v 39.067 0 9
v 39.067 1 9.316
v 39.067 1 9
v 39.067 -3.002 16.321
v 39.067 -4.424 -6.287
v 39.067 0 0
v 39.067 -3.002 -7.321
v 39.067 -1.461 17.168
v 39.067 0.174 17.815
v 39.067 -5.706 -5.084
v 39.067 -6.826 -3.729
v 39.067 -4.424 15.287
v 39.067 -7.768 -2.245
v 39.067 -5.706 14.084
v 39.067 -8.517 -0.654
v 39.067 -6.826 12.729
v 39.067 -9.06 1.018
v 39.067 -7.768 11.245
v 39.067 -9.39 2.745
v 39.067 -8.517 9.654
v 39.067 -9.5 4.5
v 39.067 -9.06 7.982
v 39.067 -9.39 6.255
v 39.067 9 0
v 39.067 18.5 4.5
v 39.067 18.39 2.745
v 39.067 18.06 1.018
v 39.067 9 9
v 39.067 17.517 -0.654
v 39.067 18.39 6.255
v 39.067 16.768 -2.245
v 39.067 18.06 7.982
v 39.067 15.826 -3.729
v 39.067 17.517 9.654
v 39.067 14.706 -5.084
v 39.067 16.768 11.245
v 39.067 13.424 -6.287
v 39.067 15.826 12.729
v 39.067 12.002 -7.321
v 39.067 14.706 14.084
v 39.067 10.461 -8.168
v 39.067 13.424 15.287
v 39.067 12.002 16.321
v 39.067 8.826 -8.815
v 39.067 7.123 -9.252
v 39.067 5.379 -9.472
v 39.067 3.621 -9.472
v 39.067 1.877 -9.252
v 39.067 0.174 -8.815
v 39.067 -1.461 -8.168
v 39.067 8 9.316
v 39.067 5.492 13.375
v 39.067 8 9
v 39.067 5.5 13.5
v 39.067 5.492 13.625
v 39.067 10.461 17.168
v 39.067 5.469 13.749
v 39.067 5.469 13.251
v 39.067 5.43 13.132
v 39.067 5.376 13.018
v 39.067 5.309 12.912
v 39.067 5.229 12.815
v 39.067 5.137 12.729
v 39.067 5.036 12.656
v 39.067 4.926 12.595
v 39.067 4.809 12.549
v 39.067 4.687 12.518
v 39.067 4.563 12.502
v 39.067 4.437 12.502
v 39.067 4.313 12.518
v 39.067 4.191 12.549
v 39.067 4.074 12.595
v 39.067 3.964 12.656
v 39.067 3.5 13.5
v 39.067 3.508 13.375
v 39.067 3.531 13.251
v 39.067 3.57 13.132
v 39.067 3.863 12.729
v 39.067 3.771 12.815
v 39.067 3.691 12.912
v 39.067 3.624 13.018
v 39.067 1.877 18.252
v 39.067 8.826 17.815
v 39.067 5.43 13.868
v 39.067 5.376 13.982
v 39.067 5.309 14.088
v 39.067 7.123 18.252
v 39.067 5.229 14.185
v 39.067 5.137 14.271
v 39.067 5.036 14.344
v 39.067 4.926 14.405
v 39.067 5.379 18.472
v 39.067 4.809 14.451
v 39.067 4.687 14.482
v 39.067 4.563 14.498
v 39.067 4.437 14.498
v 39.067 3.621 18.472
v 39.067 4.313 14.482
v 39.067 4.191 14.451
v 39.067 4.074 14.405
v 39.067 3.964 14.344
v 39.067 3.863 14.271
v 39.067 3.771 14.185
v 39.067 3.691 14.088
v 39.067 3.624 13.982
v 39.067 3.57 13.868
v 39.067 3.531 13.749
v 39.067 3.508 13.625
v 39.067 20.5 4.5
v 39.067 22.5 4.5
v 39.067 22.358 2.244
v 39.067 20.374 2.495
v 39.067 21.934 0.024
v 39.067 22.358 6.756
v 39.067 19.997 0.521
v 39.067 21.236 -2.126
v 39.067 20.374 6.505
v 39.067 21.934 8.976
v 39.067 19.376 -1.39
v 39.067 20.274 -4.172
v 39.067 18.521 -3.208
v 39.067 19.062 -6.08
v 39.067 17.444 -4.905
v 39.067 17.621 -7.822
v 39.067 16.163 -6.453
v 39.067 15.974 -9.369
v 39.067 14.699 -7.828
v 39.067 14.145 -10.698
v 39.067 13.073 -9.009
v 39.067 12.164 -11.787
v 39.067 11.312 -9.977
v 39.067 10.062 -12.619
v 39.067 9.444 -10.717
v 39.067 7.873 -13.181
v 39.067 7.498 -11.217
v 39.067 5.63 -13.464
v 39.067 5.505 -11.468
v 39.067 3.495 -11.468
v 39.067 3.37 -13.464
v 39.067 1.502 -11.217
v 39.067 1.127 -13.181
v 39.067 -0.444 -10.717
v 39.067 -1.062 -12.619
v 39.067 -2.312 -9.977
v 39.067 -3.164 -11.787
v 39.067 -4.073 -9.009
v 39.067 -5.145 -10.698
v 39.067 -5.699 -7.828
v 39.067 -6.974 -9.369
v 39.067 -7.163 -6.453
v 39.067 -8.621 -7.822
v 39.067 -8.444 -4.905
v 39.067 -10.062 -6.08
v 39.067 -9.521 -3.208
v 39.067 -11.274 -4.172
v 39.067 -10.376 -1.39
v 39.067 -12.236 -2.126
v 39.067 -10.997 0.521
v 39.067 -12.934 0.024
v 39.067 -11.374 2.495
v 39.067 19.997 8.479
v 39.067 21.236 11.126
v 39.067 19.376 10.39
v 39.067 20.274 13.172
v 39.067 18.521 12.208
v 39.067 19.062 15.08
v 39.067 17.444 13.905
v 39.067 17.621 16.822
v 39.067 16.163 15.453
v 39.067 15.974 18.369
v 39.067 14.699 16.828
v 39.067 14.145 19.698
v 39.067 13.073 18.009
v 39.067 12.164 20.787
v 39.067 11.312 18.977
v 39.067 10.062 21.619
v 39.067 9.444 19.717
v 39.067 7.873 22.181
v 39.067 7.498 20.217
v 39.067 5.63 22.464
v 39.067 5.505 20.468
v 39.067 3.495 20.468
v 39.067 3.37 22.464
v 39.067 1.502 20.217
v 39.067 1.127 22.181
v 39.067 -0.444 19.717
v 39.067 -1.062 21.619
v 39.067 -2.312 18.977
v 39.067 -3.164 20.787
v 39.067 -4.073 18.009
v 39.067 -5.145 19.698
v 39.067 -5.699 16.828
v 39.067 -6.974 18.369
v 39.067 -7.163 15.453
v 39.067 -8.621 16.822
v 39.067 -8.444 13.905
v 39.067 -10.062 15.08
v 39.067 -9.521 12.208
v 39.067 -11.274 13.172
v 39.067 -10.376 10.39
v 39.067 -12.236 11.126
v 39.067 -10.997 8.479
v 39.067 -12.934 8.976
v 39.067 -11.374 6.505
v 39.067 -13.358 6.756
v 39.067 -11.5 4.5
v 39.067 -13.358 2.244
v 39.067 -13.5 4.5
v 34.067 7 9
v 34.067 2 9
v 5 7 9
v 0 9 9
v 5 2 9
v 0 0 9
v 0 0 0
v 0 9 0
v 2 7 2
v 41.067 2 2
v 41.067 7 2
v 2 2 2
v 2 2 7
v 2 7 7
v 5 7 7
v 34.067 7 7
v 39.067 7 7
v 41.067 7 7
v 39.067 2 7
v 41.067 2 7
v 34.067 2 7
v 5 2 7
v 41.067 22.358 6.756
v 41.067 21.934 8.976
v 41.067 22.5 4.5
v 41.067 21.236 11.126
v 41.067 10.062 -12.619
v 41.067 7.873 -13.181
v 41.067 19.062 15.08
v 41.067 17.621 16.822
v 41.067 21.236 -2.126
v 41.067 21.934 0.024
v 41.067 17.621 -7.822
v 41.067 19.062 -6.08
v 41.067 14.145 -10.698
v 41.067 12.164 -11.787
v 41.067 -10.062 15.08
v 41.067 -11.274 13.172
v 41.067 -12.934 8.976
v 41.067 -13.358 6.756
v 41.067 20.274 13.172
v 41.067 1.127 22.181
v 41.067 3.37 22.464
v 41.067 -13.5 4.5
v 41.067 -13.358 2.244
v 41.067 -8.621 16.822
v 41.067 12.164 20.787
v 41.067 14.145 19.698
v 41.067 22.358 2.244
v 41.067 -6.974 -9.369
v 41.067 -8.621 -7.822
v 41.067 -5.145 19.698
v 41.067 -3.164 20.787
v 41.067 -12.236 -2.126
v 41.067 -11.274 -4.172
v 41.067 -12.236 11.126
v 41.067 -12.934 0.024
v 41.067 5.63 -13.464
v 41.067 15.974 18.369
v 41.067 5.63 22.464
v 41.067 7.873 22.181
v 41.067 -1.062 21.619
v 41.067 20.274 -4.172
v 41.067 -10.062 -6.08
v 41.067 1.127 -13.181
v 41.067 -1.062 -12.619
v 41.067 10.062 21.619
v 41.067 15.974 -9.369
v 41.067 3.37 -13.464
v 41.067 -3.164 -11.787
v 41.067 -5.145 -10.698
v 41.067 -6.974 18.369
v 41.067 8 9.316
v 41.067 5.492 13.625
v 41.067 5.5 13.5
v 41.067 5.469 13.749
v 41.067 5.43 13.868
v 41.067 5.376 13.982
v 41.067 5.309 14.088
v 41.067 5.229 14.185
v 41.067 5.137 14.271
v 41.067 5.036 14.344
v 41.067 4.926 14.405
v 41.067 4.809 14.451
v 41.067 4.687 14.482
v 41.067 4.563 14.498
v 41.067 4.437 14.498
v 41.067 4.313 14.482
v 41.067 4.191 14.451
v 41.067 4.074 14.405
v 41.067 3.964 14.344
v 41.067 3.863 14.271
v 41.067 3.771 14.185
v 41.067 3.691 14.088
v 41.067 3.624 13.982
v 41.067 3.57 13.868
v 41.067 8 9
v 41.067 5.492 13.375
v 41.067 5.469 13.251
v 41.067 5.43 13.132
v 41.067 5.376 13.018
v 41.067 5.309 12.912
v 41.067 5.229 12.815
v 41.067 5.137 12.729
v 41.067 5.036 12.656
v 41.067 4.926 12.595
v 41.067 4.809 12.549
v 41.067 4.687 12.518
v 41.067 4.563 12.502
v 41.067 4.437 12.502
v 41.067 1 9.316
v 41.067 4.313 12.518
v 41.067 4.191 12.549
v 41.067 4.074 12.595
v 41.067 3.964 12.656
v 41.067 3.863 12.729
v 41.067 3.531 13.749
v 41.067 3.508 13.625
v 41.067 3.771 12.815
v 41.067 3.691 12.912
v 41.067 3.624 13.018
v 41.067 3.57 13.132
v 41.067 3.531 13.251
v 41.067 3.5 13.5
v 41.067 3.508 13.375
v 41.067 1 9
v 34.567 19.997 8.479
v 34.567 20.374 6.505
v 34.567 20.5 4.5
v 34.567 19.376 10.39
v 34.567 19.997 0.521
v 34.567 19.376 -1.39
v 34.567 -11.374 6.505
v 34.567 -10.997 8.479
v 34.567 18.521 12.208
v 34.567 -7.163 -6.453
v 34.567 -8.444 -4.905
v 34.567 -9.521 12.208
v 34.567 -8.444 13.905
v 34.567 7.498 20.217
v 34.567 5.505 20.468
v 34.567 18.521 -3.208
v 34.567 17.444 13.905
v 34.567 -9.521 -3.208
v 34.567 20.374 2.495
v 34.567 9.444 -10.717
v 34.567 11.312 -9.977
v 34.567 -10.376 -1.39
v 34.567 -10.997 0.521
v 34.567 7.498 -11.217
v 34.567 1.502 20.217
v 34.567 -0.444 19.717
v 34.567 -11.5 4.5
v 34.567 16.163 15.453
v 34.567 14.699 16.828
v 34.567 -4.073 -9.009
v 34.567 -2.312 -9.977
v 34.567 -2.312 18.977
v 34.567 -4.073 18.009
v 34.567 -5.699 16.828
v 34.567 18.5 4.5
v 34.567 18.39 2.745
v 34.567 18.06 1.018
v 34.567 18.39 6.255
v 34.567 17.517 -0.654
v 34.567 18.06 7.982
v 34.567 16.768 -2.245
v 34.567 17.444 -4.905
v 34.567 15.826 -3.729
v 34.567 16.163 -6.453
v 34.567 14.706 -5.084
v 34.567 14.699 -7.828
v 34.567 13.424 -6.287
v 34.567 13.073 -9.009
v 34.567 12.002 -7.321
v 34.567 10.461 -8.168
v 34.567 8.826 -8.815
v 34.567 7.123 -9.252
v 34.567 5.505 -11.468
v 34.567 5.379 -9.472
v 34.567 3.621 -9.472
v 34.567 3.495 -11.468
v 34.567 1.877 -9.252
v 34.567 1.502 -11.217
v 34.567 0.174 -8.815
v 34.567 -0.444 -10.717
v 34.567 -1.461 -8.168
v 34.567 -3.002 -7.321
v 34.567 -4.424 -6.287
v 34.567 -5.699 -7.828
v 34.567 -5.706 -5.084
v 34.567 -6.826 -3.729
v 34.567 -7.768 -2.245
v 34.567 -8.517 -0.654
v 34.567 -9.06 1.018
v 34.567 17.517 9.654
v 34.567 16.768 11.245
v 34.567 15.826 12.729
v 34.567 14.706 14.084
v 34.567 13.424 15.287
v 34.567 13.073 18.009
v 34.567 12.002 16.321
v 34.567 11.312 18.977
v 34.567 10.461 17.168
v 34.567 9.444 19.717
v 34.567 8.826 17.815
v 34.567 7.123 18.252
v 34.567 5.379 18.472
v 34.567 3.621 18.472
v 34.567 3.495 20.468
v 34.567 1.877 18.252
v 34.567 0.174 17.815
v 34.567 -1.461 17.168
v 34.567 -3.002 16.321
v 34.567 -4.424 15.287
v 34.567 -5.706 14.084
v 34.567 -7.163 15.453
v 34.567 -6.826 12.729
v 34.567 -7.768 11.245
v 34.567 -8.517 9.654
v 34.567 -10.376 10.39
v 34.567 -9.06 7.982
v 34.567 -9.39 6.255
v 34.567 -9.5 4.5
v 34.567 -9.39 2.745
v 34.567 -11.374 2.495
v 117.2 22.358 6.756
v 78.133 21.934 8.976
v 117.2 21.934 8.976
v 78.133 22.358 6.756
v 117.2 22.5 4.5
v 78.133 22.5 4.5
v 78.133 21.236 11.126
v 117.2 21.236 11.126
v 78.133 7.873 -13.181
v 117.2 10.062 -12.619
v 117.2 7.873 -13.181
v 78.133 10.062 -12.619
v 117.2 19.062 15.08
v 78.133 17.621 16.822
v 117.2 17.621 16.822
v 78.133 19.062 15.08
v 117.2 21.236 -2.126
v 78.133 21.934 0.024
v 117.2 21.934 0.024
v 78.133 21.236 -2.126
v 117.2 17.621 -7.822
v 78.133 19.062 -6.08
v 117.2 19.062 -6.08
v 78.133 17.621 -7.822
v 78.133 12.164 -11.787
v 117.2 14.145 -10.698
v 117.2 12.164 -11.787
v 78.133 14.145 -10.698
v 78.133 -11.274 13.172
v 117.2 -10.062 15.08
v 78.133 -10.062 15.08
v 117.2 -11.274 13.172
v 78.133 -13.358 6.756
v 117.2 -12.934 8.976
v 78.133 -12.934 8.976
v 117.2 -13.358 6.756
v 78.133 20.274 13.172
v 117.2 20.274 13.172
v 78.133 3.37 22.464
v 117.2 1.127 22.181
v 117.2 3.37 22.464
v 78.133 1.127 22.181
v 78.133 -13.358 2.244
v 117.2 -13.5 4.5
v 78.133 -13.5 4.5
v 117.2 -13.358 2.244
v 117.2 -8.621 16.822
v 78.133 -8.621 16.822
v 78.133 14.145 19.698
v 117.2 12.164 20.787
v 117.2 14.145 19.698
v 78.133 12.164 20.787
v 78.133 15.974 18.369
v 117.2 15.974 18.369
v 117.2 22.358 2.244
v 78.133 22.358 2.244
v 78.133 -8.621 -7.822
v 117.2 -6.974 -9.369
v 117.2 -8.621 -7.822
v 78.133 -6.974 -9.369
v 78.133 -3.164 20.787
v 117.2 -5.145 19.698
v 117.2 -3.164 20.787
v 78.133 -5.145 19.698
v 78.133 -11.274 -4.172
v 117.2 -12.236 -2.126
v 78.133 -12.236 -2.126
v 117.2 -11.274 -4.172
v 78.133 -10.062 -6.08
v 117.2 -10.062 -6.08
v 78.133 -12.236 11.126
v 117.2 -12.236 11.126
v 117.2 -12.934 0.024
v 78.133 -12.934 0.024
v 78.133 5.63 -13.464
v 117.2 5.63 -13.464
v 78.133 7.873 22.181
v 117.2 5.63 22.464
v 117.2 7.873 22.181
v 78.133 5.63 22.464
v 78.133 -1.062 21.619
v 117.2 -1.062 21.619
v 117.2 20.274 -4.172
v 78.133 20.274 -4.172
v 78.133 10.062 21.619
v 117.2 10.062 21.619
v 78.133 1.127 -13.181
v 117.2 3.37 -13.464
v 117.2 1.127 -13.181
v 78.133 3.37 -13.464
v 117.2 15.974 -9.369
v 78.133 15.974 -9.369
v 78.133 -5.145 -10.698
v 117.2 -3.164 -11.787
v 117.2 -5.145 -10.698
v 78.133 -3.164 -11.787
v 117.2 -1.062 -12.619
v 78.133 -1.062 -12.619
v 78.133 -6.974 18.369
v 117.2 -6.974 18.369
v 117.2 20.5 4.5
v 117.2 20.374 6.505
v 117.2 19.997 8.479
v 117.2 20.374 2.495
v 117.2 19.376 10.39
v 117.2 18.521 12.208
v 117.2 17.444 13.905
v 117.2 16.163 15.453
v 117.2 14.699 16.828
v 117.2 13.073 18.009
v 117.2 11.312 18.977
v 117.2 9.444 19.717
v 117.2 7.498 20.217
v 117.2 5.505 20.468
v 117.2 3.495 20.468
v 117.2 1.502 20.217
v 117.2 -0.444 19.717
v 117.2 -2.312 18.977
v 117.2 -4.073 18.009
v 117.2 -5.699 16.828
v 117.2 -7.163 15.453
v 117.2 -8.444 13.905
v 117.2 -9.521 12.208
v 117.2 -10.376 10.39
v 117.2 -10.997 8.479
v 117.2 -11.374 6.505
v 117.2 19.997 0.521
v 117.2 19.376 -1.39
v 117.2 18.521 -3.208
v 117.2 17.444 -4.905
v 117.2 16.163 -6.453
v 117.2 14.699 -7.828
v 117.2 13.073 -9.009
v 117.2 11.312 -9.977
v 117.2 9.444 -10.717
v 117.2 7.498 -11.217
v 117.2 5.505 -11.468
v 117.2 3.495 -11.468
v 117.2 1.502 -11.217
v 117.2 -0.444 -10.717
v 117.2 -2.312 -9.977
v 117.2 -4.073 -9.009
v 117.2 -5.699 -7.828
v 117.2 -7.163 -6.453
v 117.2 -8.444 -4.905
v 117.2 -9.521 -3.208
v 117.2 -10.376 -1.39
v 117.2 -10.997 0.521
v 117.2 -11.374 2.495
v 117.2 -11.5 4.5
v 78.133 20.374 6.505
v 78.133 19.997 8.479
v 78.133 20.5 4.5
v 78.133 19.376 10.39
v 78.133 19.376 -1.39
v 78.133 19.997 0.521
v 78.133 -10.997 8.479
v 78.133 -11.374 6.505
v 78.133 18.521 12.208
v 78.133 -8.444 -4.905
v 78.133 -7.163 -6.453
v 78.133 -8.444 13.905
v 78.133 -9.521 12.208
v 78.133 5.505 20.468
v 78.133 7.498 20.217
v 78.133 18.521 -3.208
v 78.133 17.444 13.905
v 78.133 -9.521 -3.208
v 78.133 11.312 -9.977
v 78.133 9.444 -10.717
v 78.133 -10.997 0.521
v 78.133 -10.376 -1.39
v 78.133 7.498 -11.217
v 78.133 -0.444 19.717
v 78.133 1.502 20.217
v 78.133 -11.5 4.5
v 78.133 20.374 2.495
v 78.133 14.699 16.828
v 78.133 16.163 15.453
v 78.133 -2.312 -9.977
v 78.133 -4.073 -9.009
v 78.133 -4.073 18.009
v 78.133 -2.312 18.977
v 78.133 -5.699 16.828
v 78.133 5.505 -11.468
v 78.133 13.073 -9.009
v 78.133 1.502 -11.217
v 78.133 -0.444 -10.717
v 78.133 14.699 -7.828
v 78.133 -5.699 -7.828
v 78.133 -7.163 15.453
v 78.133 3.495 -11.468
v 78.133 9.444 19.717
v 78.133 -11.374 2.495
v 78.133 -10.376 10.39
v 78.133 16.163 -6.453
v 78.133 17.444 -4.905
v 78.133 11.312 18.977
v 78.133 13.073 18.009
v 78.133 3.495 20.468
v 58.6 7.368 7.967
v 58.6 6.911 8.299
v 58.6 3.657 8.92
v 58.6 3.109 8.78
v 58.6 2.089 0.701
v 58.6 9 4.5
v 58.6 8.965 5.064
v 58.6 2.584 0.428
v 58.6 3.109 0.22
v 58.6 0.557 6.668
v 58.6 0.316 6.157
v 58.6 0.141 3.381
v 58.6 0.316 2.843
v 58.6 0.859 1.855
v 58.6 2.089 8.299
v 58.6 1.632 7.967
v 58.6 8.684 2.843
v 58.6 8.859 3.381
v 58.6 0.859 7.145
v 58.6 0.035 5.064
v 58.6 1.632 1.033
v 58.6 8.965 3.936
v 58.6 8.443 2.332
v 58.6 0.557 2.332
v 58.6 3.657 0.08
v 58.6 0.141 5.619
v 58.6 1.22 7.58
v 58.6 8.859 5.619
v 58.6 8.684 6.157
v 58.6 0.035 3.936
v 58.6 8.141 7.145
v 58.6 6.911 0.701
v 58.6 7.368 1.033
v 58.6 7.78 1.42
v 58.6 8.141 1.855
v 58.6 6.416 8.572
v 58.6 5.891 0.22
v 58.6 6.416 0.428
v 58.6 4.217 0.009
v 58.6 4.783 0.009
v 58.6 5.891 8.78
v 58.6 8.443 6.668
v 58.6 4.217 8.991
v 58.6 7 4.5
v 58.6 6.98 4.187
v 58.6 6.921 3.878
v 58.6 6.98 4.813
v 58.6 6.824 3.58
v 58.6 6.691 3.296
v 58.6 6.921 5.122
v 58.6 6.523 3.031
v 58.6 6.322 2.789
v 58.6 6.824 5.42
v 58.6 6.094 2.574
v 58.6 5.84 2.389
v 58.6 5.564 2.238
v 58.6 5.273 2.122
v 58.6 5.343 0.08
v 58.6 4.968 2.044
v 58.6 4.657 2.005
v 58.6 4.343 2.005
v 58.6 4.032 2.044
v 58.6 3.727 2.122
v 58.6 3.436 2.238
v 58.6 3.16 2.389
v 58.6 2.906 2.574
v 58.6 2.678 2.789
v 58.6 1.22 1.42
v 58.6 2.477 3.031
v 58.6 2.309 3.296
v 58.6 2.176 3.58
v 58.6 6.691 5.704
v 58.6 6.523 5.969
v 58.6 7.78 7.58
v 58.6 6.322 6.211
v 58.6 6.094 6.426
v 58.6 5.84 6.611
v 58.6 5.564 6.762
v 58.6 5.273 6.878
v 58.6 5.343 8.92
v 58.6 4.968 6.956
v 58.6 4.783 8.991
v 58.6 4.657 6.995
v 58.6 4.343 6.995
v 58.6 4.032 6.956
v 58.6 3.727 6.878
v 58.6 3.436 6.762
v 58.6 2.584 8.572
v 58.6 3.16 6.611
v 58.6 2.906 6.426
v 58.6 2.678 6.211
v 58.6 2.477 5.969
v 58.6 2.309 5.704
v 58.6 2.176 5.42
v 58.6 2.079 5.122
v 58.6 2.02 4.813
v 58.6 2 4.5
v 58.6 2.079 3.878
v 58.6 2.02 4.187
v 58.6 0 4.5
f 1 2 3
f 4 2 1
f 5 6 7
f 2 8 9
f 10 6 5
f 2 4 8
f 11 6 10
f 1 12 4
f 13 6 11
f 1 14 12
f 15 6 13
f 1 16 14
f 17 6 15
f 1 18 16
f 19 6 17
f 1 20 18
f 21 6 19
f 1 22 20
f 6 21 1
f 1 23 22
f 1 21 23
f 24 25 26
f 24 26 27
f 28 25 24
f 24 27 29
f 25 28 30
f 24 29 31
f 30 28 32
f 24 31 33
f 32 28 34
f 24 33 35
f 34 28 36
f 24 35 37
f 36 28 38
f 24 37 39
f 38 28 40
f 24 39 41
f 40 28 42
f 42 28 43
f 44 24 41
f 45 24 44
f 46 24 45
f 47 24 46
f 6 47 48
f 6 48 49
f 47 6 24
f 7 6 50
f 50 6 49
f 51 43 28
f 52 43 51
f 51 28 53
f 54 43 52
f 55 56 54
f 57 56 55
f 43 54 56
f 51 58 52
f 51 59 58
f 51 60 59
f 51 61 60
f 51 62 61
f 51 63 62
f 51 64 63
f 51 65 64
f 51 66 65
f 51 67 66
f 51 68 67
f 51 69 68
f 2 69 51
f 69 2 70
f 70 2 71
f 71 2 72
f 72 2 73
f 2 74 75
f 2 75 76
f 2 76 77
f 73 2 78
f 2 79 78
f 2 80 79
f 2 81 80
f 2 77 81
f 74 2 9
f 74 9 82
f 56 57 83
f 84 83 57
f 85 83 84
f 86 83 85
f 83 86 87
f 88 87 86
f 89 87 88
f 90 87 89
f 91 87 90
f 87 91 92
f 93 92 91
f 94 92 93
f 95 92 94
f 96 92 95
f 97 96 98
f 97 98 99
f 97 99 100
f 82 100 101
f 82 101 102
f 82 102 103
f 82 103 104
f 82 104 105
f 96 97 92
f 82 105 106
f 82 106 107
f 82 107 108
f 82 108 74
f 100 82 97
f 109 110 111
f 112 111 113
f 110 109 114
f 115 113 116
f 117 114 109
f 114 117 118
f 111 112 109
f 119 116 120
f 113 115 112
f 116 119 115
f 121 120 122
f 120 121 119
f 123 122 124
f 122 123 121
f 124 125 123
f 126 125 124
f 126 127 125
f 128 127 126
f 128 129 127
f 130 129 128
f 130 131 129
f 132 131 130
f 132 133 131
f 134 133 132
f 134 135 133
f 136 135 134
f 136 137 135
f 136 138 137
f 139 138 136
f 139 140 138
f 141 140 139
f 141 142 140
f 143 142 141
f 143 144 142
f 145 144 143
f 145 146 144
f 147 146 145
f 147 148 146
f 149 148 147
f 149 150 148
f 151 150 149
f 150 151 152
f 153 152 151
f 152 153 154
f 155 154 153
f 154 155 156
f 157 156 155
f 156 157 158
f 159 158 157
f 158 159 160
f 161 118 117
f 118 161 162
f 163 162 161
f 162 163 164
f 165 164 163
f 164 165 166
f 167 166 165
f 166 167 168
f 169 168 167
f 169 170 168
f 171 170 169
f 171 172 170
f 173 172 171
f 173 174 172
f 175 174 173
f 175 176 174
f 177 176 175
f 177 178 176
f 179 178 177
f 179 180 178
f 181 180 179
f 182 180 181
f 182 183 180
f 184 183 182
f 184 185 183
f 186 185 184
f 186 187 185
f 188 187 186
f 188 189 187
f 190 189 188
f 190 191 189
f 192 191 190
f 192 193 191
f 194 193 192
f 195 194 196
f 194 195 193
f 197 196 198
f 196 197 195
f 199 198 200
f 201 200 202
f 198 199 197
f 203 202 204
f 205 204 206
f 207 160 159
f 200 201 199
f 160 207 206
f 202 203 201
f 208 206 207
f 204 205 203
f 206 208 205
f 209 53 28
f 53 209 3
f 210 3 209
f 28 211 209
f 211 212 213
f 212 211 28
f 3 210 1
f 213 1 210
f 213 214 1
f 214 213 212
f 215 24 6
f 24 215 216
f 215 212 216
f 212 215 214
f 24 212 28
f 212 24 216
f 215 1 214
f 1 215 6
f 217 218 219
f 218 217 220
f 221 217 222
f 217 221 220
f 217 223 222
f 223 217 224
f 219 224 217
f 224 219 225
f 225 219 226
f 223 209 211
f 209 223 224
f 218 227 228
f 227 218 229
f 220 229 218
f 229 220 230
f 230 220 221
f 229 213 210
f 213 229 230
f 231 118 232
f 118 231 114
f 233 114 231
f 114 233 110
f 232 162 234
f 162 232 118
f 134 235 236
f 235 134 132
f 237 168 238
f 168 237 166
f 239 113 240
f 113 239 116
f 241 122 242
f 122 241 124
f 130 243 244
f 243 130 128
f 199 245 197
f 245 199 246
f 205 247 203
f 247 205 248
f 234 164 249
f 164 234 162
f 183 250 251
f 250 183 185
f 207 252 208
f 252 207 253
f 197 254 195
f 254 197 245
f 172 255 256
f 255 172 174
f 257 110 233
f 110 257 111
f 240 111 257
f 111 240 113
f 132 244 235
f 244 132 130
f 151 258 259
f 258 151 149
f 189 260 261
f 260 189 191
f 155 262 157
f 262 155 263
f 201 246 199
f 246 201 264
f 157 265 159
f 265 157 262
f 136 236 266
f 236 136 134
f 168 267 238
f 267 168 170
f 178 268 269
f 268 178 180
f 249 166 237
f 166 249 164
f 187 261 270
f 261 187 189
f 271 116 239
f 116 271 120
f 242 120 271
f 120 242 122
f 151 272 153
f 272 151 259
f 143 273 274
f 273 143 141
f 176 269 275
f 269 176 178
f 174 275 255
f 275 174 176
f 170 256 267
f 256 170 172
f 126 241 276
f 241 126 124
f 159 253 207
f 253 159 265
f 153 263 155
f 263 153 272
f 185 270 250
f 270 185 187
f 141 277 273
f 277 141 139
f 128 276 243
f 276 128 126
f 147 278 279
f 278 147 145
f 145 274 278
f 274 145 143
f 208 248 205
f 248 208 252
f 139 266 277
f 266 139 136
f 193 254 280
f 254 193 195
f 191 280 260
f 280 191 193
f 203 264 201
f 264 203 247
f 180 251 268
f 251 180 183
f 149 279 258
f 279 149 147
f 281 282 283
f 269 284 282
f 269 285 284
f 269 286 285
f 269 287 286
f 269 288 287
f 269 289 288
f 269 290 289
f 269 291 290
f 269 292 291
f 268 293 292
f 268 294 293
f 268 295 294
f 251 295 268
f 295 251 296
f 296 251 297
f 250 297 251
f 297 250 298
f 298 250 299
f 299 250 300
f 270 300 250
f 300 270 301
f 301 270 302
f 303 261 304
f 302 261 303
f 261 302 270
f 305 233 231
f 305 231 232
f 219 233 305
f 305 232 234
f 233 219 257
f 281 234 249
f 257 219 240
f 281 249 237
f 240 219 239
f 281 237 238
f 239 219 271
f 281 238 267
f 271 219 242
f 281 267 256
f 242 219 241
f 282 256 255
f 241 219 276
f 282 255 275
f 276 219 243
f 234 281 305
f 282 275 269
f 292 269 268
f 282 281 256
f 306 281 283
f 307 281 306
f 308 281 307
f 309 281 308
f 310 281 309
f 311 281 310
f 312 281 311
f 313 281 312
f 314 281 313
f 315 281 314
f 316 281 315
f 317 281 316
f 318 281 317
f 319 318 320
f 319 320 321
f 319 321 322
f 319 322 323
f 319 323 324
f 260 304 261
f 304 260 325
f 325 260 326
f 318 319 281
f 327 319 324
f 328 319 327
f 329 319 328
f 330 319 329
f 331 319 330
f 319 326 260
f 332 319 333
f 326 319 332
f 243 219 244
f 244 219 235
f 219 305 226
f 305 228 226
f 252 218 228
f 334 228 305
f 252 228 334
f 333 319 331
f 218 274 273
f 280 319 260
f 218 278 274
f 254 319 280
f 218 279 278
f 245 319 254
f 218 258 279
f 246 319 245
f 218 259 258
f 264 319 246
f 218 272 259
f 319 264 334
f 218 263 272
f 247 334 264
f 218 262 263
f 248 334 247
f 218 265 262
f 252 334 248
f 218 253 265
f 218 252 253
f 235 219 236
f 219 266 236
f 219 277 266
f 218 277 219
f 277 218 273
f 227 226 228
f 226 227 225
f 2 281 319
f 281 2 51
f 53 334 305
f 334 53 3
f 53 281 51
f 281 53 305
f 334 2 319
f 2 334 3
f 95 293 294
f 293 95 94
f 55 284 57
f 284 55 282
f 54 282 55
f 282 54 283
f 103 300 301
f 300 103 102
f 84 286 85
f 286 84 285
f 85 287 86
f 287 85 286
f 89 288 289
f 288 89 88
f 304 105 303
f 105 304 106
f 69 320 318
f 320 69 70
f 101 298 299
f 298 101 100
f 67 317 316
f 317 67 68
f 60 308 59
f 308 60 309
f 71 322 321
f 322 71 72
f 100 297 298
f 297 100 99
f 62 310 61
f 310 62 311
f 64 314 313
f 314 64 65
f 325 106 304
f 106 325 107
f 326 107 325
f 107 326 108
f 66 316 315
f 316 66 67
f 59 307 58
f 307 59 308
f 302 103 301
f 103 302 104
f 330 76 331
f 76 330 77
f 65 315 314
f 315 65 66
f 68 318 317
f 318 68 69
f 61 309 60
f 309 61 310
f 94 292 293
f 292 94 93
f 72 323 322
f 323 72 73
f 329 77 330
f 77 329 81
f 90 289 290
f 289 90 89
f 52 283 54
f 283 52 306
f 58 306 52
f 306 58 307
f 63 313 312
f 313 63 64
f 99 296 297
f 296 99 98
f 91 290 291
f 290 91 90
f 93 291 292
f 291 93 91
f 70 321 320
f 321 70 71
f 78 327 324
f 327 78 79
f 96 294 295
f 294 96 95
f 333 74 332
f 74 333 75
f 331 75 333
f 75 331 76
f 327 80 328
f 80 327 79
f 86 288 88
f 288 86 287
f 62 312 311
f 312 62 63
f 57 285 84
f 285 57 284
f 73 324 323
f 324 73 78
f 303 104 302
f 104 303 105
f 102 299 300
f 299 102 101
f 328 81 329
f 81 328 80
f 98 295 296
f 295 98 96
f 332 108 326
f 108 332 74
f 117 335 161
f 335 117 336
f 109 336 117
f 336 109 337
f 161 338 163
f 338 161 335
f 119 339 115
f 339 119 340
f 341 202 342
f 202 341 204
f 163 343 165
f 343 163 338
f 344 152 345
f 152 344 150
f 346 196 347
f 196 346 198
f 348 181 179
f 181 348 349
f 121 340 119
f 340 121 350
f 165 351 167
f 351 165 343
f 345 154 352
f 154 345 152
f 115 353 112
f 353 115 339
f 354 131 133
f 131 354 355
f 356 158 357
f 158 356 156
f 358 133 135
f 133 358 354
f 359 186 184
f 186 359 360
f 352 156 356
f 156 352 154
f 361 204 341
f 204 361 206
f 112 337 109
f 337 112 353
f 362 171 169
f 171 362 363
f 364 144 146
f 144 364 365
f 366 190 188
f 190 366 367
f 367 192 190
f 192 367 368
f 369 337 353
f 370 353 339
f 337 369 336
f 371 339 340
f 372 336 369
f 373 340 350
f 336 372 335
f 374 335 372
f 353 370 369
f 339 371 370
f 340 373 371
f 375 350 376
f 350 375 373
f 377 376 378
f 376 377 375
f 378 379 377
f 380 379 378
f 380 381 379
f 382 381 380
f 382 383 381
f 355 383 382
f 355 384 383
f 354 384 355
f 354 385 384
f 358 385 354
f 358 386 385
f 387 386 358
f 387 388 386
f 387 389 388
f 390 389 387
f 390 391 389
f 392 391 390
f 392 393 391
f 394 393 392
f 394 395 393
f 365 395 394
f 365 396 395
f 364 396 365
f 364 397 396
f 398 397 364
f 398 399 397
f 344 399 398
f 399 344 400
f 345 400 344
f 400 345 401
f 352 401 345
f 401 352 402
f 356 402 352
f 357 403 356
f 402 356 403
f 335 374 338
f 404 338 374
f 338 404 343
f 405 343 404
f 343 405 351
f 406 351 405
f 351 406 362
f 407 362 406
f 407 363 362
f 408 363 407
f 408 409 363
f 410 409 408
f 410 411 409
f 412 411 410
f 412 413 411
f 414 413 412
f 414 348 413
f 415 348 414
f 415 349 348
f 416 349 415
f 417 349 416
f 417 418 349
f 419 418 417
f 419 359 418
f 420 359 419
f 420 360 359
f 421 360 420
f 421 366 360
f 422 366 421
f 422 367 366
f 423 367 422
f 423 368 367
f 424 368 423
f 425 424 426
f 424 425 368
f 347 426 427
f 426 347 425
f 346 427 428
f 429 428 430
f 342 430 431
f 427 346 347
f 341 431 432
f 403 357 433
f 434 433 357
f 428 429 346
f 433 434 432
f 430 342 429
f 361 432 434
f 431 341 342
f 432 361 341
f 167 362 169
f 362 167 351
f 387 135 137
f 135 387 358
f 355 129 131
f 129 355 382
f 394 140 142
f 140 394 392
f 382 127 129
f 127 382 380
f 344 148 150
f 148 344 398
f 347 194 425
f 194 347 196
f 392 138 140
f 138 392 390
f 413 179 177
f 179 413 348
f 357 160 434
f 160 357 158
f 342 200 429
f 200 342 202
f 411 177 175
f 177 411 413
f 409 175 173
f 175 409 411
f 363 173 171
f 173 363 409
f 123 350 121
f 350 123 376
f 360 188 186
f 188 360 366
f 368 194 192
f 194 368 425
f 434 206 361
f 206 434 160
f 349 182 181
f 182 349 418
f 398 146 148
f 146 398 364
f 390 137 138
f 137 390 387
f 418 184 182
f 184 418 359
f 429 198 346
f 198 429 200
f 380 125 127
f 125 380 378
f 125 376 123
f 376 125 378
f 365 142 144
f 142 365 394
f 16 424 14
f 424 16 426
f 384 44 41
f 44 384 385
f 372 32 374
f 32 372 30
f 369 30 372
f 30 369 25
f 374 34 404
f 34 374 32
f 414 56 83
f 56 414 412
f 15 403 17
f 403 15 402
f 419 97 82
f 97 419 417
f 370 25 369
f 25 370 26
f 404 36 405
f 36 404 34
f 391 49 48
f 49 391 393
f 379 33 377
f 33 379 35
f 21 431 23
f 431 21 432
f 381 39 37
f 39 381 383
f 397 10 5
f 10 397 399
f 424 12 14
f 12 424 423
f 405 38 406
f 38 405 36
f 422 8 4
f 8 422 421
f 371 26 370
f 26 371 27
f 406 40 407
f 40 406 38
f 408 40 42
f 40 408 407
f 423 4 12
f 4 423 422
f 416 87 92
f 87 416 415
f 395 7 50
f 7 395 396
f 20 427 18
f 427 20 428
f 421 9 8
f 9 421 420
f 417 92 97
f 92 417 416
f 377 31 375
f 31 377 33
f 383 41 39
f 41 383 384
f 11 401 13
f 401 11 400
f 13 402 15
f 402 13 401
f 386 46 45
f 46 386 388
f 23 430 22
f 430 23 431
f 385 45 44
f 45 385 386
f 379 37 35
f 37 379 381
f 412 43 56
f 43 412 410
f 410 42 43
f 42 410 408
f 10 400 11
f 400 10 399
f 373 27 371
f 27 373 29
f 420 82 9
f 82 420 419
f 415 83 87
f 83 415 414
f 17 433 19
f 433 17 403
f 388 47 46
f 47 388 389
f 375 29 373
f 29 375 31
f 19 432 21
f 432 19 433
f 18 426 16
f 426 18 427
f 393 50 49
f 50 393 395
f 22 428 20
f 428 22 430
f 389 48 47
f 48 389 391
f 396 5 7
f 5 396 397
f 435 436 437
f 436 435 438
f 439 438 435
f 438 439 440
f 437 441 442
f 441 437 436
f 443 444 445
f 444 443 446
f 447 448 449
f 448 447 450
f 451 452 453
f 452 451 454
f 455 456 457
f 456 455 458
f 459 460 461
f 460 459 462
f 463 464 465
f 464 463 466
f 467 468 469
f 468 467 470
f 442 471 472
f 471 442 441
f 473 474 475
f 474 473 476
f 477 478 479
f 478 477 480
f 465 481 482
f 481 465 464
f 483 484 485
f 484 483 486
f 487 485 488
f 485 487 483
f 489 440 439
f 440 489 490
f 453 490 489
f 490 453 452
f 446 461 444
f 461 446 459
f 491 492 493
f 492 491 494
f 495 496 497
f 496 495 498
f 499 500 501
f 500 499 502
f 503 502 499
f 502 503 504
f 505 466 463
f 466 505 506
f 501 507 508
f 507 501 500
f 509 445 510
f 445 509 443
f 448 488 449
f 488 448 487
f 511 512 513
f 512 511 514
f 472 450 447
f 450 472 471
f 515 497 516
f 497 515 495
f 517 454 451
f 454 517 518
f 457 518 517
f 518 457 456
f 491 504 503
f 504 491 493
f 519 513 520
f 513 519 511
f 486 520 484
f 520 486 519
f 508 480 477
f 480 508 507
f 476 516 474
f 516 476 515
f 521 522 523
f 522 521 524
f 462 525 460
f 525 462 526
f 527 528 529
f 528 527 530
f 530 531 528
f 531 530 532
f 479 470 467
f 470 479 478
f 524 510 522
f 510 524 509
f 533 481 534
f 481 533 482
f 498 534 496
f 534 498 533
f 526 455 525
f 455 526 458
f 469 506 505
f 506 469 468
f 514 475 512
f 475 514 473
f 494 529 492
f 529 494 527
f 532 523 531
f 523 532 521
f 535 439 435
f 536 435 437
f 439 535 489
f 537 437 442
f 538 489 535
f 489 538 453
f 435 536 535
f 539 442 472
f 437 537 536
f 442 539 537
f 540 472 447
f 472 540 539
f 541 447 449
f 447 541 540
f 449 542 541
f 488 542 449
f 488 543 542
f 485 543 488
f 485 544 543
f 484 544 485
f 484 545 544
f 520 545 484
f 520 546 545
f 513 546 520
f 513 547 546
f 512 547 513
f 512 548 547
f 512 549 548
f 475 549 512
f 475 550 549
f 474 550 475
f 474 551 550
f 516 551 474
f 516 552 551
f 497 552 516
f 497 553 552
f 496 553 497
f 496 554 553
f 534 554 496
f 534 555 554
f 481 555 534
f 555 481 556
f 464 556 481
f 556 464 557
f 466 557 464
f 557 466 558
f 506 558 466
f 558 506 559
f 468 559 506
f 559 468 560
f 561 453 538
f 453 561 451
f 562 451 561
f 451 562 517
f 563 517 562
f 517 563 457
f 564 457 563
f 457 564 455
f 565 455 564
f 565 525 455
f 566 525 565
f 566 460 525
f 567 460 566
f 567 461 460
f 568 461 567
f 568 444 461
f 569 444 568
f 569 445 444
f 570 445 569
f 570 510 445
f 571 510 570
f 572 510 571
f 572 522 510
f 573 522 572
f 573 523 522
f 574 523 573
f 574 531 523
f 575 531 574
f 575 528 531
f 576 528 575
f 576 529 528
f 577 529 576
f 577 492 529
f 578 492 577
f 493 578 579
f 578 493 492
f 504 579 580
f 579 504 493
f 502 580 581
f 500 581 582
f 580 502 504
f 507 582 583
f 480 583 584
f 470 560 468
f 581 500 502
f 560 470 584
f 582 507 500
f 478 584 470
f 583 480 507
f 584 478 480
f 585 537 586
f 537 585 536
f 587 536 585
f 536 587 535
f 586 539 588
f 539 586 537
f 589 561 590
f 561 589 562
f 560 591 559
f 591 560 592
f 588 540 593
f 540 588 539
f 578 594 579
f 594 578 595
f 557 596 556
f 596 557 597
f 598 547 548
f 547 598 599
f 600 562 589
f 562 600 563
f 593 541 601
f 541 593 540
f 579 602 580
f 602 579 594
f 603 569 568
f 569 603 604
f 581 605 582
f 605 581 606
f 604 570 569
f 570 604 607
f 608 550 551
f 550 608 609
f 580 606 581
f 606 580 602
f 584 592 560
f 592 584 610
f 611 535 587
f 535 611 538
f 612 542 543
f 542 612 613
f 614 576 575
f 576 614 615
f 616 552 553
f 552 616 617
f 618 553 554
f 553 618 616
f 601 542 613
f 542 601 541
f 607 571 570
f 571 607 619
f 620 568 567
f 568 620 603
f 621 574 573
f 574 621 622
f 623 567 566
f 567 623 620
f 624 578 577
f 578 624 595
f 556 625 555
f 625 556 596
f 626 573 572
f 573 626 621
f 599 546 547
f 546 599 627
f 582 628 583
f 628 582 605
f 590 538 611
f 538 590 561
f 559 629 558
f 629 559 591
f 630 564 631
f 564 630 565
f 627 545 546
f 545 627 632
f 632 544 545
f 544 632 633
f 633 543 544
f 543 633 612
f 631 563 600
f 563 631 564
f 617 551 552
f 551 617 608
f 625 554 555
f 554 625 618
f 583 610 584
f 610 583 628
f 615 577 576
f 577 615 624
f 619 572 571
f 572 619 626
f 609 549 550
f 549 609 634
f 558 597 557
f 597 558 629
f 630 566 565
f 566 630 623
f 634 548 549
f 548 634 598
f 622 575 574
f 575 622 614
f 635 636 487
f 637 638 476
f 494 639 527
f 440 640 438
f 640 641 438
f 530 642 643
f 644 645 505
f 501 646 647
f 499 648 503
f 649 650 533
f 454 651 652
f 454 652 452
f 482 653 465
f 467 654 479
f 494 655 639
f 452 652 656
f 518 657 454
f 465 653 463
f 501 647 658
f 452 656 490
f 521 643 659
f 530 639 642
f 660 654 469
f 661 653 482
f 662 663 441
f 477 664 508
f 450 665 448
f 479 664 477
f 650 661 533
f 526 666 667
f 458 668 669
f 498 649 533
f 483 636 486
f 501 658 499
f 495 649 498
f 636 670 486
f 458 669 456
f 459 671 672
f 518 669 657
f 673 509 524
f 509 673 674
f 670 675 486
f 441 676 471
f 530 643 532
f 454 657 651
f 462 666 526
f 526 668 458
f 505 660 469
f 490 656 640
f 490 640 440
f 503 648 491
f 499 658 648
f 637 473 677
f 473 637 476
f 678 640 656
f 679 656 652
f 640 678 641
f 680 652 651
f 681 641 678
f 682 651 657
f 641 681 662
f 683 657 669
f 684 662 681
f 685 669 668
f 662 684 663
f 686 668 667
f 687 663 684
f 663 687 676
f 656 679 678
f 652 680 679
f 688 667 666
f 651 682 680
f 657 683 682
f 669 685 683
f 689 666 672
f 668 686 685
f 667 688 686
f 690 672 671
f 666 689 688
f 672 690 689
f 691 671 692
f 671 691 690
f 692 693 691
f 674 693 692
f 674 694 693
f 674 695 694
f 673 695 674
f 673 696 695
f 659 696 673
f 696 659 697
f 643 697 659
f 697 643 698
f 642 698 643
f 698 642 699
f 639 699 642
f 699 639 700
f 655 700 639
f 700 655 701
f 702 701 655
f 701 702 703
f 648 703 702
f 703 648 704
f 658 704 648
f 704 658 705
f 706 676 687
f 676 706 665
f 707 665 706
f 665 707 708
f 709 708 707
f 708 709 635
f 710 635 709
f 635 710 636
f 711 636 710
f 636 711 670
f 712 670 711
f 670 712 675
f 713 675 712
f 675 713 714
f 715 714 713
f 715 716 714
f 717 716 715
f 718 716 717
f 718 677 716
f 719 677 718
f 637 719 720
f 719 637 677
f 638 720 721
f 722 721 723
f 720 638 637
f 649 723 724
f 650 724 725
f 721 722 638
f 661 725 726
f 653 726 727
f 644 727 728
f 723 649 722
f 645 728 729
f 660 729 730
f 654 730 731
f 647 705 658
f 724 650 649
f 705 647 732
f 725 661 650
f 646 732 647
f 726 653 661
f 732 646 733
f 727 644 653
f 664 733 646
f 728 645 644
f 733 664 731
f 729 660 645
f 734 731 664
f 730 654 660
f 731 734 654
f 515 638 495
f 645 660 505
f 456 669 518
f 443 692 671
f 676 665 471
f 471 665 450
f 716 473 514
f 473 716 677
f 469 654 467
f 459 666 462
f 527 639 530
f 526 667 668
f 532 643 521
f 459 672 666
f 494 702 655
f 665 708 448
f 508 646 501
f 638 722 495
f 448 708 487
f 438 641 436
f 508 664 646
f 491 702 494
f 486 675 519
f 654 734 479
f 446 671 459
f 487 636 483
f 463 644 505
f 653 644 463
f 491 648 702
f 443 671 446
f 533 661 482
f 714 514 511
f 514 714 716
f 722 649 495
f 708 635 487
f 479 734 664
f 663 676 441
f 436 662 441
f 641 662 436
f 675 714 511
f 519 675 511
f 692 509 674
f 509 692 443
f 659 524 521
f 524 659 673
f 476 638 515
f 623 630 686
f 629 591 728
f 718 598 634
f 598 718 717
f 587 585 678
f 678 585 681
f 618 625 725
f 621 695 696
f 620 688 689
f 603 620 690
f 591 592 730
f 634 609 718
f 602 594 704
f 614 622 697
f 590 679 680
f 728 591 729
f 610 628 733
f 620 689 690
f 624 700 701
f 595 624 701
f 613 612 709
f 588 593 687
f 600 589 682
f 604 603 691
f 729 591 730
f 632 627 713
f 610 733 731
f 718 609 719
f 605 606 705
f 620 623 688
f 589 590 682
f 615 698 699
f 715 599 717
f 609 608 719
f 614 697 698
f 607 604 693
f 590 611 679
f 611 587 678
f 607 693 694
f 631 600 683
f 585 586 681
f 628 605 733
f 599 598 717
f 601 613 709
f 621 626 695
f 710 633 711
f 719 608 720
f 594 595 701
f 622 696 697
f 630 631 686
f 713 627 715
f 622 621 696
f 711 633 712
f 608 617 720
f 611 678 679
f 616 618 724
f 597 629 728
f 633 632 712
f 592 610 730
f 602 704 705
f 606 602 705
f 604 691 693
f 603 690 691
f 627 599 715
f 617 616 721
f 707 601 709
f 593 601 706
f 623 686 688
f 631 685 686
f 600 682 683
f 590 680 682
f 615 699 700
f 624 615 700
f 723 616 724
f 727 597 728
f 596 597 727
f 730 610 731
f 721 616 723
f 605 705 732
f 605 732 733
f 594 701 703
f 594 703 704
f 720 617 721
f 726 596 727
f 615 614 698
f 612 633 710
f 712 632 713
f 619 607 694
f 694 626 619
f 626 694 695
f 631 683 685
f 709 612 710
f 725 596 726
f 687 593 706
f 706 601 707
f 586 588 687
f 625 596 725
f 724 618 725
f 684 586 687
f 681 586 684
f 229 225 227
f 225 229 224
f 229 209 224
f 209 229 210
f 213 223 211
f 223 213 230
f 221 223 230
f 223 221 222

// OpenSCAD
//Parameters (get estimates from reed pipe spreadsheet)
//All measurements in mm

//Extend length by 33%
//Use square cross-section
//Walls are all 2mm and overlap with reed width

//Assuming a brass "reed"

Reed_length = 29.3; //estimated oscillating length

Reed_width = 7;
Reed_thickness = 0.316;
wall_thickness = 2;
wire_diameter = 2;


//Intermediate parameters (calculated)

Channel_length = Reed_length*(4/3);
Channel_side_out= Reed_width+(wall_thickness);
Channel_side_in= Reed_width- (wall_thickness);
SU=Channel_side_out/2;
wire_radius = wire_diameter/2;
foot_hole_radius = SU;


//Shallot
    
difference(){
    
    cube([Channel_length, Channel_side_out, Channel_side_out]);

    translate([wall_thickness,wall_thickness,wall_thickness])
        cube([Channel_length, Channel_side_in, 2*Channel_side_in]);
}


difference(){
    
    //Boot cap
    translate([Channel_length,SU,SU])
        rotate([90,0,90])
            cylinder(h=wall_thickness,r1=SU*4,r2=SU*4,$fn=50);
    
    //Sounding hole
    translate([Channel_length-(wall_thickness/2),wall_thickness,wall_thickness])
        cube([wall_thickness*2,Channel_side_in, Channel_side_in]);
    
    //Reed slot
    translate([Channel_length-(wall_thickness/2),wall_thickness/2,SU*2])
        cube([wall_thickness*2,Reed_width, Reed_thickness]);
    
    //Wire hole
    translate([Channel_length-(wall_thickness/2),SU,SU*3])
        rotate([90,0,90])
            cylinder(h=wall_thickness*2,r1=wire_radius,r2=wire_radius,$fn=50);

}

//Little shallot cover thingy1
translate([Channel_length-Channel_side_in,wall_thickness,wall_thickness+Channel_side_in])
    cube([Channel_side_in, Channel_side_in,wall_thickness,]);


//Little shallot cover thingy2
translate([0,wall_thickness,wall_thickness+Channel_side_in])
    cube([Channel_side_in, Channel_side_in,wall_thickness,]);


//Friction fit surface
difference(){
    translate([Channel_length-SU,SU,SU])
            rotate([90,0,90])
                cylinder(h=SU,r1=(SU*4)-wall_thickness,r2=(SU*4)-wall_thickness,$fn=50);
    translate([Channel_length-SU-1,SU,SU])
            rotate([90,0,90])
                cylinder(h=SU+1,r1=(SU*4)-2*wall_thickness,r2=(SU*4)-2*wall_thickness,$fn=50);
}


//Boot side
difference(){
    translate([Channel_length*2,SU,SU])
        rotate([90,0,90])
            cylinder(h=Channel_length,r1=SU*4,r2=SU*4,$fn=50);
   
    translate([Channel_length*2,SU,SU])
        rotate([90,0,90])
            cylinder(h=Channel_length,r1=(SU*4)-wall_thickness,r2=(SU*4)-wall_thickness,$fn=50);
    
}

//Boot base
difference(){
    translate([Channel_length*1.5,SU,SU])
        rotate([90,0,90])
            cylinder(h=Channel_length/2,r1=SU,r2=SU*4,$fn=50);
   
    translate([Channel_length*1.5,SU,SU])
        rotate([90,0,90])
            cylinder(h=Channel_length/2,r1=(SU)-wall_thickness,r2=(SU*4)-wall_thickness,$fn=50);
}
